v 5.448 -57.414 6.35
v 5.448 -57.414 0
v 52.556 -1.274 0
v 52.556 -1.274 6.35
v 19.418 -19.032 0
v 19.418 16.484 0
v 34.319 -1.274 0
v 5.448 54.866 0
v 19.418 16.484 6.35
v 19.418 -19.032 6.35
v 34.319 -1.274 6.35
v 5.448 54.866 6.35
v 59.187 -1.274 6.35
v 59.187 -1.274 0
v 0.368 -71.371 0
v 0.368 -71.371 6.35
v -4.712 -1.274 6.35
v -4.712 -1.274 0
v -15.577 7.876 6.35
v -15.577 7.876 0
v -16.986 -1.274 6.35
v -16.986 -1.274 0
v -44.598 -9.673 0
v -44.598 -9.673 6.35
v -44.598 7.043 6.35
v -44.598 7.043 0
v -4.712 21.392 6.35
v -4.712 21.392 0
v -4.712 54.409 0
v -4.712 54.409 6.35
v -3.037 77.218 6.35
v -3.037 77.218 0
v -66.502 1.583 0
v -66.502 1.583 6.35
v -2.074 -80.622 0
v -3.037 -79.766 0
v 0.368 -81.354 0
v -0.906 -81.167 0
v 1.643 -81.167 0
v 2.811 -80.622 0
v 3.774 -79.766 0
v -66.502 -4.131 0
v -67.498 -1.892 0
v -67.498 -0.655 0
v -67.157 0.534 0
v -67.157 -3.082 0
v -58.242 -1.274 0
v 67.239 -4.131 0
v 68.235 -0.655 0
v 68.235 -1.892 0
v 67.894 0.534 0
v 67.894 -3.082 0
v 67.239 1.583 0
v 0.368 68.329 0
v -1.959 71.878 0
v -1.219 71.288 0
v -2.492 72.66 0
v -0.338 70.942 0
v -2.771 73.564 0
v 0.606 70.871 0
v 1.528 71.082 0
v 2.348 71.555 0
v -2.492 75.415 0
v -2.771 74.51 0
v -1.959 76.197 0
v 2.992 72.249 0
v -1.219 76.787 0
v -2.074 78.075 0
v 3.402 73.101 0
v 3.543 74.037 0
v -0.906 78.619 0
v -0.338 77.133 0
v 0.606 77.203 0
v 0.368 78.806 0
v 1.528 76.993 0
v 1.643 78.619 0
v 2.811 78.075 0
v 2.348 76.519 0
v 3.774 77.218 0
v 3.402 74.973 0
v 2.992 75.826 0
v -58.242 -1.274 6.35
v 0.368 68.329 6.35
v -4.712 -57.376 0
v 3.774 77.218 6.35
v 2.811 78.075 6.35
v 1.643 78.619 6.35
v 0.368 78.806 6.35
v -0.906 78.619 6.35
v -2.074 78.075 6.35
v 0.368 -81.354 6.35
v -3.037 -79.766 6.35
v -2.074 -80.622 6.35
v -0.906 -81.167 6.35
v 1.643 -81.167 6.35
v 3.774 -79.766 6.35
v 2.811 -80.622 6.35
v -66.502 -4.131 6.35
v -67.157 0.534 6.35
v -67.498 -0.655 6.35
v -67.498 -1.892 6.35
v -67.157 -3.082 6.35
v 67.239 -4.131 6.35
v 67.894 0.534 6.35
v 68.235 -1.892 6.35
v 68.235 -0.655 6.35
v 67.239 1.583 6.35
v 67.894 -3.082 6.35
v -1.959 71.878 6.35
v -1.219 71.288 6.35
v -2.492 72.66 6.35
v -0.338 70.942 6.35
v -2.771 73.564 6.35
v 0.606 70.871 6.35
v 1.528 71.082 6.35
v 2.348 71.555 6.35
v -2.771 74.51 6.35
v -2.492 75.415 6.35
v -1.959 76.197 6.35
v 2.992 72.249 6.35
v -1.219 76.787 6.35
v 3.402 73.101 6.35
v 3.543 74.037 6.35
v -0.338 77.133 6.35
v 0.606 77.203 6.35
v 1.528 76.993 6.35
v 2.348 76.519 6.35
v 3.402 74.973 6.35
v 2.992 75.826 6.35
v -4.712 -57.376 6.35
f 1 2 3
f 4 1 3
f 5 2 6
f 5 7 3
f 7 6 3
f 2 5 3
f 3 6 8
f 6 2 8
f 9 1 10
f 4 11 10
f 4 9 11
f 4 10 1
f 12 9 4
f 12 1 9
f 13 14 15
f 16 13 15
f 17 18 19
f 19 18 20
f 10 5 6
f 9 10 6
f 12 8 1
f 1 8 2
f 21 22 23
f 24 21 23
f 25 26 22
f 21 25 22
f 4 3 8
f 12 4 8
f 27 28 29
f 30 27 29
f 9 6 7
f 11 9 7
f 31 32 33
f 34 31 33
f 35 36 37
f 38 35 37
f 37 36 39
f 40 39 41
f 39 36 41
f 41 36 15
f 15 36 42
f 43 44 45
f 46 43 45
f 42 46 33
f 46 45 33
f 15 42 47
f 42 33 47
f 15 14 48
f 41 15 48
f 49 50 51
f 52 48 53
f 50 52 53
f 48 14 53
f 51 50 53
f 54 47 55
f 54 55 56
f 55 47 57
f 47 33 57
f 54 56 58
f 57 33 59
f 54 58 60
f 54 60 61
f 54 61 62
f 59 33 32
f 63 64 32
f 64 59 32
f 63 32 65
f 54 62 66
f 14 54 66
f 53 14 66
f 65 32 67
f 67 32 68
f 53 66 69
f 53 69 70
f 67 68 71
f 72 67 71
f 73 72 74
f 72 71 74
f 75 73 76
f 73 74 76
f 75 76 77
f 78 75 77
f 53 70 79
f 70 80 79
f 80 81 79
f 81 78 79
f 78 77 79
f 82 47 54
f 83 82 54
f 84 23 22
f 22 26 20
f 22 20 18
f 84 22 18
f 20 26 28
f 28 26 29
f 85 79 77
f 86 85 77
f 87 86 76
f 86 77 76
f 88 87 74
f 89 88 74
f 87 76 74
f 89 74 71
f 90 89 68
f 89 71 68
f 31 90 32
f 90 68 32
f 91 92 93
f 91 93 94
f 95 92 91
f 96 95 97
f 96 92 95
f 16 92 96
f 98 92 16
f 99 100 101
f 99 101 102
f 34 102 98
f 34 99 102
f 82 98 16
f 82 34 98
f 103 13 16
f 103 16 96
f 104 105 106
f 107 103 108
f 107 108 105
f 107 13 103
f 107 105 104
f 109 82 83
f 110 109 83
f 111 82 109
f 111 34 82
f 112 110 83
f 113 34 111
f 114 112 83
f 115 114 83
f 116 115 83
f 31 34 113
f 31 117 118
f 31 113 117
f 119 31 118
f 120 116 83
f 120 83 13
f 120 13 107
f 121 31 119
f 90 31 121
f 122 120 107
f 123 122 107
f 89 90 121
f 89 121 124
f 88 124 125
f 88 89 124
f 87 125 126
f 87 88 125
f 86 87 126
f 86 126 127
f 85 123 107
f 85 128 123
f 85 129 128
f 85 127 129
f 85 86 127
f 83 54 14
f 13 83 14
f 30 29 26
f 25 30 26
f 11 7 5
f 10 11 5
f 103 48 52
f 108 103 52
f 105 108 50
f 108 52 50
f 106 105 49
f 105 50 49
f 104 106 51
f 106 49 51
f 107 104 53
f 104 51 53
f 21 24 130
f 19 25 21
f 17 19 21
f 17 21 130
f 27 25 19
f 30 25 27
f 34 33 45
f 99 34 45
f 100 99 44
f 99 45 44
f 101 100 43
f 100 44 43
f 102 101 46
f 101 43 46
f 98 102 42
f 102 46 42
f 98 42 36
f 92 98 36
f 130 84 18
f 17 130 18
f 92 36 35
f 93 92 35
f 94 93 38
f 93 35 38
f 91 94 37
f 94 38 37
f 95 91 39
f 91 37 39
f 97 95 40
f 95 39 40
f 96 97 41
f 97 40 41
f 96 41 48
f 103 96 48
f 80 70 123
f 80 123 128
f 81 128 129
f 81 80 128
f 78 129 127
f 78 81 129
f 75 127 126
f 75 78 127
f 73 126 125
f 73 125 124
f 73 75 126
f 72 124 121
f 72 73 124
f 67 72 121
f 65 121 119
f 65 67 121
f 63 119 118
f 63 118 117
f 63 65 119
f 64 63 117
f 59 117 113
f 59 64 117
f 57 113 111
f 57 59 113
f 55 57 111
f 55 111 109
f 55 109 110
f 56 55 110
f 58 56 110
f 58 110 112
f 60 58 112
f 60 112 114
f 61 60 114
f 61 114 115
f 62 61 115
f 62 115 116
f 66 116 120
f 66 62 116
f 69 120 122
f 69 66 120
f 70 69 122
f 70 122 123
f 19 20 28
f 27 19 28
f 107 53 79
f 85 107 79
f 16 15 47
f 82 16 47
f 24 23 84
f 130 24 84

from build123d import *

# Parameters (mm, degrees)
F0_R     = 3.175
F1_DEPTH = 6.35


# Not quite as in the source:
# - a length typed as a fraction of an inch, garbled in the dataset ("3 / 203.2 mm" for 3/8 in), is restored


with BuildPart() as f1:
    # F0 (on Top) → F1 (new body)
    with BuildSketch(Plane.XY):
        with BuildLine():
            ThreePointArc((3.7735161073, 77.2181461795), (0.3684485576, 78.8059552545), (-3.036618992, 77.2181461795))
            Line((-3.036618992, 77.2181461795), (-66.5017581446, 1.5833385899))
            ThreePointArc((-66.5017581446, 1.5833385899), (-67.541690595, -1.2738523351), (-66.5017581446, -4.1310432602))
            Line((-66.5017581446, -4.1310432602), (-3.036618992, -79.7658508498))
            ThreePointArc((-3.036618992, -79.7658508498), (0.3684485576, -81.3536599247), (3.7735161073, -79.7658508498))
            Line((3.7735161073, -79.7658508498), (67.2386552599, -4.1310432602))
            ThreePointArc((67.2386552599, -4.1310432602), (68.2785877102, -1.2738523351), (67.2386552599, 1.5833385899))
            Line((67.2386552599, 1.5833385899), (3.7735161073, 77.2181461795))
        make_face()
        Polygon((0.3684485576, -71.3712848975), (-58.2422290914, -1.2738523351), (0.3684485576, 68.3287151025), (59.1871783672, -1.2738523351), align=None, mode=Mode.SUBTRACT)
        with Locations((0.3684485576, 74.0371476649)):
            Circle(F0_R, mode=Mode.SUBTRACT)
    extrude(amount=F1_DEPTH)


with BuildPart() as f1b:
    # F0 (on Top) → F1, piece 2 (new body)
    with BuildSketch(Plane.XY):
        Polygon((52.5557093374, -1.2738523351), (5.4484485576, 54.8663949365), (5.4484485576, -57.4140996067), align=None)
        Polygon((19.4184485576, -19.0318400569), (19.4184485576, 16.4841353867), (34.3191695055, -1.2738523351), align=None, mode=Mode.SUBTRACT)
    extrude(amount=F1_DEPTH)


with BuildPart() as f1c:
    # F0 (on Top) → F1, piece 3 (new body)
    with BuildSketch(Plane.XY):
        Polygon((-4.7115514424, 21.3924322091), (-4.7115514424, 54.4093134561), (-44.5979606519, 7.0425775949), (-16.9856430717, -1.2738523351), (-44.5979606519, -9.6726273153), (-4.7115514424, -57.3761344554), (-4.7115514424, -1.2738523351), (-15.5774667458, 7.87607823), align=None)
    extrude(amount=F1_DEPTH)


solid = Compound([f1.part, f1b.part, f1c.part])
